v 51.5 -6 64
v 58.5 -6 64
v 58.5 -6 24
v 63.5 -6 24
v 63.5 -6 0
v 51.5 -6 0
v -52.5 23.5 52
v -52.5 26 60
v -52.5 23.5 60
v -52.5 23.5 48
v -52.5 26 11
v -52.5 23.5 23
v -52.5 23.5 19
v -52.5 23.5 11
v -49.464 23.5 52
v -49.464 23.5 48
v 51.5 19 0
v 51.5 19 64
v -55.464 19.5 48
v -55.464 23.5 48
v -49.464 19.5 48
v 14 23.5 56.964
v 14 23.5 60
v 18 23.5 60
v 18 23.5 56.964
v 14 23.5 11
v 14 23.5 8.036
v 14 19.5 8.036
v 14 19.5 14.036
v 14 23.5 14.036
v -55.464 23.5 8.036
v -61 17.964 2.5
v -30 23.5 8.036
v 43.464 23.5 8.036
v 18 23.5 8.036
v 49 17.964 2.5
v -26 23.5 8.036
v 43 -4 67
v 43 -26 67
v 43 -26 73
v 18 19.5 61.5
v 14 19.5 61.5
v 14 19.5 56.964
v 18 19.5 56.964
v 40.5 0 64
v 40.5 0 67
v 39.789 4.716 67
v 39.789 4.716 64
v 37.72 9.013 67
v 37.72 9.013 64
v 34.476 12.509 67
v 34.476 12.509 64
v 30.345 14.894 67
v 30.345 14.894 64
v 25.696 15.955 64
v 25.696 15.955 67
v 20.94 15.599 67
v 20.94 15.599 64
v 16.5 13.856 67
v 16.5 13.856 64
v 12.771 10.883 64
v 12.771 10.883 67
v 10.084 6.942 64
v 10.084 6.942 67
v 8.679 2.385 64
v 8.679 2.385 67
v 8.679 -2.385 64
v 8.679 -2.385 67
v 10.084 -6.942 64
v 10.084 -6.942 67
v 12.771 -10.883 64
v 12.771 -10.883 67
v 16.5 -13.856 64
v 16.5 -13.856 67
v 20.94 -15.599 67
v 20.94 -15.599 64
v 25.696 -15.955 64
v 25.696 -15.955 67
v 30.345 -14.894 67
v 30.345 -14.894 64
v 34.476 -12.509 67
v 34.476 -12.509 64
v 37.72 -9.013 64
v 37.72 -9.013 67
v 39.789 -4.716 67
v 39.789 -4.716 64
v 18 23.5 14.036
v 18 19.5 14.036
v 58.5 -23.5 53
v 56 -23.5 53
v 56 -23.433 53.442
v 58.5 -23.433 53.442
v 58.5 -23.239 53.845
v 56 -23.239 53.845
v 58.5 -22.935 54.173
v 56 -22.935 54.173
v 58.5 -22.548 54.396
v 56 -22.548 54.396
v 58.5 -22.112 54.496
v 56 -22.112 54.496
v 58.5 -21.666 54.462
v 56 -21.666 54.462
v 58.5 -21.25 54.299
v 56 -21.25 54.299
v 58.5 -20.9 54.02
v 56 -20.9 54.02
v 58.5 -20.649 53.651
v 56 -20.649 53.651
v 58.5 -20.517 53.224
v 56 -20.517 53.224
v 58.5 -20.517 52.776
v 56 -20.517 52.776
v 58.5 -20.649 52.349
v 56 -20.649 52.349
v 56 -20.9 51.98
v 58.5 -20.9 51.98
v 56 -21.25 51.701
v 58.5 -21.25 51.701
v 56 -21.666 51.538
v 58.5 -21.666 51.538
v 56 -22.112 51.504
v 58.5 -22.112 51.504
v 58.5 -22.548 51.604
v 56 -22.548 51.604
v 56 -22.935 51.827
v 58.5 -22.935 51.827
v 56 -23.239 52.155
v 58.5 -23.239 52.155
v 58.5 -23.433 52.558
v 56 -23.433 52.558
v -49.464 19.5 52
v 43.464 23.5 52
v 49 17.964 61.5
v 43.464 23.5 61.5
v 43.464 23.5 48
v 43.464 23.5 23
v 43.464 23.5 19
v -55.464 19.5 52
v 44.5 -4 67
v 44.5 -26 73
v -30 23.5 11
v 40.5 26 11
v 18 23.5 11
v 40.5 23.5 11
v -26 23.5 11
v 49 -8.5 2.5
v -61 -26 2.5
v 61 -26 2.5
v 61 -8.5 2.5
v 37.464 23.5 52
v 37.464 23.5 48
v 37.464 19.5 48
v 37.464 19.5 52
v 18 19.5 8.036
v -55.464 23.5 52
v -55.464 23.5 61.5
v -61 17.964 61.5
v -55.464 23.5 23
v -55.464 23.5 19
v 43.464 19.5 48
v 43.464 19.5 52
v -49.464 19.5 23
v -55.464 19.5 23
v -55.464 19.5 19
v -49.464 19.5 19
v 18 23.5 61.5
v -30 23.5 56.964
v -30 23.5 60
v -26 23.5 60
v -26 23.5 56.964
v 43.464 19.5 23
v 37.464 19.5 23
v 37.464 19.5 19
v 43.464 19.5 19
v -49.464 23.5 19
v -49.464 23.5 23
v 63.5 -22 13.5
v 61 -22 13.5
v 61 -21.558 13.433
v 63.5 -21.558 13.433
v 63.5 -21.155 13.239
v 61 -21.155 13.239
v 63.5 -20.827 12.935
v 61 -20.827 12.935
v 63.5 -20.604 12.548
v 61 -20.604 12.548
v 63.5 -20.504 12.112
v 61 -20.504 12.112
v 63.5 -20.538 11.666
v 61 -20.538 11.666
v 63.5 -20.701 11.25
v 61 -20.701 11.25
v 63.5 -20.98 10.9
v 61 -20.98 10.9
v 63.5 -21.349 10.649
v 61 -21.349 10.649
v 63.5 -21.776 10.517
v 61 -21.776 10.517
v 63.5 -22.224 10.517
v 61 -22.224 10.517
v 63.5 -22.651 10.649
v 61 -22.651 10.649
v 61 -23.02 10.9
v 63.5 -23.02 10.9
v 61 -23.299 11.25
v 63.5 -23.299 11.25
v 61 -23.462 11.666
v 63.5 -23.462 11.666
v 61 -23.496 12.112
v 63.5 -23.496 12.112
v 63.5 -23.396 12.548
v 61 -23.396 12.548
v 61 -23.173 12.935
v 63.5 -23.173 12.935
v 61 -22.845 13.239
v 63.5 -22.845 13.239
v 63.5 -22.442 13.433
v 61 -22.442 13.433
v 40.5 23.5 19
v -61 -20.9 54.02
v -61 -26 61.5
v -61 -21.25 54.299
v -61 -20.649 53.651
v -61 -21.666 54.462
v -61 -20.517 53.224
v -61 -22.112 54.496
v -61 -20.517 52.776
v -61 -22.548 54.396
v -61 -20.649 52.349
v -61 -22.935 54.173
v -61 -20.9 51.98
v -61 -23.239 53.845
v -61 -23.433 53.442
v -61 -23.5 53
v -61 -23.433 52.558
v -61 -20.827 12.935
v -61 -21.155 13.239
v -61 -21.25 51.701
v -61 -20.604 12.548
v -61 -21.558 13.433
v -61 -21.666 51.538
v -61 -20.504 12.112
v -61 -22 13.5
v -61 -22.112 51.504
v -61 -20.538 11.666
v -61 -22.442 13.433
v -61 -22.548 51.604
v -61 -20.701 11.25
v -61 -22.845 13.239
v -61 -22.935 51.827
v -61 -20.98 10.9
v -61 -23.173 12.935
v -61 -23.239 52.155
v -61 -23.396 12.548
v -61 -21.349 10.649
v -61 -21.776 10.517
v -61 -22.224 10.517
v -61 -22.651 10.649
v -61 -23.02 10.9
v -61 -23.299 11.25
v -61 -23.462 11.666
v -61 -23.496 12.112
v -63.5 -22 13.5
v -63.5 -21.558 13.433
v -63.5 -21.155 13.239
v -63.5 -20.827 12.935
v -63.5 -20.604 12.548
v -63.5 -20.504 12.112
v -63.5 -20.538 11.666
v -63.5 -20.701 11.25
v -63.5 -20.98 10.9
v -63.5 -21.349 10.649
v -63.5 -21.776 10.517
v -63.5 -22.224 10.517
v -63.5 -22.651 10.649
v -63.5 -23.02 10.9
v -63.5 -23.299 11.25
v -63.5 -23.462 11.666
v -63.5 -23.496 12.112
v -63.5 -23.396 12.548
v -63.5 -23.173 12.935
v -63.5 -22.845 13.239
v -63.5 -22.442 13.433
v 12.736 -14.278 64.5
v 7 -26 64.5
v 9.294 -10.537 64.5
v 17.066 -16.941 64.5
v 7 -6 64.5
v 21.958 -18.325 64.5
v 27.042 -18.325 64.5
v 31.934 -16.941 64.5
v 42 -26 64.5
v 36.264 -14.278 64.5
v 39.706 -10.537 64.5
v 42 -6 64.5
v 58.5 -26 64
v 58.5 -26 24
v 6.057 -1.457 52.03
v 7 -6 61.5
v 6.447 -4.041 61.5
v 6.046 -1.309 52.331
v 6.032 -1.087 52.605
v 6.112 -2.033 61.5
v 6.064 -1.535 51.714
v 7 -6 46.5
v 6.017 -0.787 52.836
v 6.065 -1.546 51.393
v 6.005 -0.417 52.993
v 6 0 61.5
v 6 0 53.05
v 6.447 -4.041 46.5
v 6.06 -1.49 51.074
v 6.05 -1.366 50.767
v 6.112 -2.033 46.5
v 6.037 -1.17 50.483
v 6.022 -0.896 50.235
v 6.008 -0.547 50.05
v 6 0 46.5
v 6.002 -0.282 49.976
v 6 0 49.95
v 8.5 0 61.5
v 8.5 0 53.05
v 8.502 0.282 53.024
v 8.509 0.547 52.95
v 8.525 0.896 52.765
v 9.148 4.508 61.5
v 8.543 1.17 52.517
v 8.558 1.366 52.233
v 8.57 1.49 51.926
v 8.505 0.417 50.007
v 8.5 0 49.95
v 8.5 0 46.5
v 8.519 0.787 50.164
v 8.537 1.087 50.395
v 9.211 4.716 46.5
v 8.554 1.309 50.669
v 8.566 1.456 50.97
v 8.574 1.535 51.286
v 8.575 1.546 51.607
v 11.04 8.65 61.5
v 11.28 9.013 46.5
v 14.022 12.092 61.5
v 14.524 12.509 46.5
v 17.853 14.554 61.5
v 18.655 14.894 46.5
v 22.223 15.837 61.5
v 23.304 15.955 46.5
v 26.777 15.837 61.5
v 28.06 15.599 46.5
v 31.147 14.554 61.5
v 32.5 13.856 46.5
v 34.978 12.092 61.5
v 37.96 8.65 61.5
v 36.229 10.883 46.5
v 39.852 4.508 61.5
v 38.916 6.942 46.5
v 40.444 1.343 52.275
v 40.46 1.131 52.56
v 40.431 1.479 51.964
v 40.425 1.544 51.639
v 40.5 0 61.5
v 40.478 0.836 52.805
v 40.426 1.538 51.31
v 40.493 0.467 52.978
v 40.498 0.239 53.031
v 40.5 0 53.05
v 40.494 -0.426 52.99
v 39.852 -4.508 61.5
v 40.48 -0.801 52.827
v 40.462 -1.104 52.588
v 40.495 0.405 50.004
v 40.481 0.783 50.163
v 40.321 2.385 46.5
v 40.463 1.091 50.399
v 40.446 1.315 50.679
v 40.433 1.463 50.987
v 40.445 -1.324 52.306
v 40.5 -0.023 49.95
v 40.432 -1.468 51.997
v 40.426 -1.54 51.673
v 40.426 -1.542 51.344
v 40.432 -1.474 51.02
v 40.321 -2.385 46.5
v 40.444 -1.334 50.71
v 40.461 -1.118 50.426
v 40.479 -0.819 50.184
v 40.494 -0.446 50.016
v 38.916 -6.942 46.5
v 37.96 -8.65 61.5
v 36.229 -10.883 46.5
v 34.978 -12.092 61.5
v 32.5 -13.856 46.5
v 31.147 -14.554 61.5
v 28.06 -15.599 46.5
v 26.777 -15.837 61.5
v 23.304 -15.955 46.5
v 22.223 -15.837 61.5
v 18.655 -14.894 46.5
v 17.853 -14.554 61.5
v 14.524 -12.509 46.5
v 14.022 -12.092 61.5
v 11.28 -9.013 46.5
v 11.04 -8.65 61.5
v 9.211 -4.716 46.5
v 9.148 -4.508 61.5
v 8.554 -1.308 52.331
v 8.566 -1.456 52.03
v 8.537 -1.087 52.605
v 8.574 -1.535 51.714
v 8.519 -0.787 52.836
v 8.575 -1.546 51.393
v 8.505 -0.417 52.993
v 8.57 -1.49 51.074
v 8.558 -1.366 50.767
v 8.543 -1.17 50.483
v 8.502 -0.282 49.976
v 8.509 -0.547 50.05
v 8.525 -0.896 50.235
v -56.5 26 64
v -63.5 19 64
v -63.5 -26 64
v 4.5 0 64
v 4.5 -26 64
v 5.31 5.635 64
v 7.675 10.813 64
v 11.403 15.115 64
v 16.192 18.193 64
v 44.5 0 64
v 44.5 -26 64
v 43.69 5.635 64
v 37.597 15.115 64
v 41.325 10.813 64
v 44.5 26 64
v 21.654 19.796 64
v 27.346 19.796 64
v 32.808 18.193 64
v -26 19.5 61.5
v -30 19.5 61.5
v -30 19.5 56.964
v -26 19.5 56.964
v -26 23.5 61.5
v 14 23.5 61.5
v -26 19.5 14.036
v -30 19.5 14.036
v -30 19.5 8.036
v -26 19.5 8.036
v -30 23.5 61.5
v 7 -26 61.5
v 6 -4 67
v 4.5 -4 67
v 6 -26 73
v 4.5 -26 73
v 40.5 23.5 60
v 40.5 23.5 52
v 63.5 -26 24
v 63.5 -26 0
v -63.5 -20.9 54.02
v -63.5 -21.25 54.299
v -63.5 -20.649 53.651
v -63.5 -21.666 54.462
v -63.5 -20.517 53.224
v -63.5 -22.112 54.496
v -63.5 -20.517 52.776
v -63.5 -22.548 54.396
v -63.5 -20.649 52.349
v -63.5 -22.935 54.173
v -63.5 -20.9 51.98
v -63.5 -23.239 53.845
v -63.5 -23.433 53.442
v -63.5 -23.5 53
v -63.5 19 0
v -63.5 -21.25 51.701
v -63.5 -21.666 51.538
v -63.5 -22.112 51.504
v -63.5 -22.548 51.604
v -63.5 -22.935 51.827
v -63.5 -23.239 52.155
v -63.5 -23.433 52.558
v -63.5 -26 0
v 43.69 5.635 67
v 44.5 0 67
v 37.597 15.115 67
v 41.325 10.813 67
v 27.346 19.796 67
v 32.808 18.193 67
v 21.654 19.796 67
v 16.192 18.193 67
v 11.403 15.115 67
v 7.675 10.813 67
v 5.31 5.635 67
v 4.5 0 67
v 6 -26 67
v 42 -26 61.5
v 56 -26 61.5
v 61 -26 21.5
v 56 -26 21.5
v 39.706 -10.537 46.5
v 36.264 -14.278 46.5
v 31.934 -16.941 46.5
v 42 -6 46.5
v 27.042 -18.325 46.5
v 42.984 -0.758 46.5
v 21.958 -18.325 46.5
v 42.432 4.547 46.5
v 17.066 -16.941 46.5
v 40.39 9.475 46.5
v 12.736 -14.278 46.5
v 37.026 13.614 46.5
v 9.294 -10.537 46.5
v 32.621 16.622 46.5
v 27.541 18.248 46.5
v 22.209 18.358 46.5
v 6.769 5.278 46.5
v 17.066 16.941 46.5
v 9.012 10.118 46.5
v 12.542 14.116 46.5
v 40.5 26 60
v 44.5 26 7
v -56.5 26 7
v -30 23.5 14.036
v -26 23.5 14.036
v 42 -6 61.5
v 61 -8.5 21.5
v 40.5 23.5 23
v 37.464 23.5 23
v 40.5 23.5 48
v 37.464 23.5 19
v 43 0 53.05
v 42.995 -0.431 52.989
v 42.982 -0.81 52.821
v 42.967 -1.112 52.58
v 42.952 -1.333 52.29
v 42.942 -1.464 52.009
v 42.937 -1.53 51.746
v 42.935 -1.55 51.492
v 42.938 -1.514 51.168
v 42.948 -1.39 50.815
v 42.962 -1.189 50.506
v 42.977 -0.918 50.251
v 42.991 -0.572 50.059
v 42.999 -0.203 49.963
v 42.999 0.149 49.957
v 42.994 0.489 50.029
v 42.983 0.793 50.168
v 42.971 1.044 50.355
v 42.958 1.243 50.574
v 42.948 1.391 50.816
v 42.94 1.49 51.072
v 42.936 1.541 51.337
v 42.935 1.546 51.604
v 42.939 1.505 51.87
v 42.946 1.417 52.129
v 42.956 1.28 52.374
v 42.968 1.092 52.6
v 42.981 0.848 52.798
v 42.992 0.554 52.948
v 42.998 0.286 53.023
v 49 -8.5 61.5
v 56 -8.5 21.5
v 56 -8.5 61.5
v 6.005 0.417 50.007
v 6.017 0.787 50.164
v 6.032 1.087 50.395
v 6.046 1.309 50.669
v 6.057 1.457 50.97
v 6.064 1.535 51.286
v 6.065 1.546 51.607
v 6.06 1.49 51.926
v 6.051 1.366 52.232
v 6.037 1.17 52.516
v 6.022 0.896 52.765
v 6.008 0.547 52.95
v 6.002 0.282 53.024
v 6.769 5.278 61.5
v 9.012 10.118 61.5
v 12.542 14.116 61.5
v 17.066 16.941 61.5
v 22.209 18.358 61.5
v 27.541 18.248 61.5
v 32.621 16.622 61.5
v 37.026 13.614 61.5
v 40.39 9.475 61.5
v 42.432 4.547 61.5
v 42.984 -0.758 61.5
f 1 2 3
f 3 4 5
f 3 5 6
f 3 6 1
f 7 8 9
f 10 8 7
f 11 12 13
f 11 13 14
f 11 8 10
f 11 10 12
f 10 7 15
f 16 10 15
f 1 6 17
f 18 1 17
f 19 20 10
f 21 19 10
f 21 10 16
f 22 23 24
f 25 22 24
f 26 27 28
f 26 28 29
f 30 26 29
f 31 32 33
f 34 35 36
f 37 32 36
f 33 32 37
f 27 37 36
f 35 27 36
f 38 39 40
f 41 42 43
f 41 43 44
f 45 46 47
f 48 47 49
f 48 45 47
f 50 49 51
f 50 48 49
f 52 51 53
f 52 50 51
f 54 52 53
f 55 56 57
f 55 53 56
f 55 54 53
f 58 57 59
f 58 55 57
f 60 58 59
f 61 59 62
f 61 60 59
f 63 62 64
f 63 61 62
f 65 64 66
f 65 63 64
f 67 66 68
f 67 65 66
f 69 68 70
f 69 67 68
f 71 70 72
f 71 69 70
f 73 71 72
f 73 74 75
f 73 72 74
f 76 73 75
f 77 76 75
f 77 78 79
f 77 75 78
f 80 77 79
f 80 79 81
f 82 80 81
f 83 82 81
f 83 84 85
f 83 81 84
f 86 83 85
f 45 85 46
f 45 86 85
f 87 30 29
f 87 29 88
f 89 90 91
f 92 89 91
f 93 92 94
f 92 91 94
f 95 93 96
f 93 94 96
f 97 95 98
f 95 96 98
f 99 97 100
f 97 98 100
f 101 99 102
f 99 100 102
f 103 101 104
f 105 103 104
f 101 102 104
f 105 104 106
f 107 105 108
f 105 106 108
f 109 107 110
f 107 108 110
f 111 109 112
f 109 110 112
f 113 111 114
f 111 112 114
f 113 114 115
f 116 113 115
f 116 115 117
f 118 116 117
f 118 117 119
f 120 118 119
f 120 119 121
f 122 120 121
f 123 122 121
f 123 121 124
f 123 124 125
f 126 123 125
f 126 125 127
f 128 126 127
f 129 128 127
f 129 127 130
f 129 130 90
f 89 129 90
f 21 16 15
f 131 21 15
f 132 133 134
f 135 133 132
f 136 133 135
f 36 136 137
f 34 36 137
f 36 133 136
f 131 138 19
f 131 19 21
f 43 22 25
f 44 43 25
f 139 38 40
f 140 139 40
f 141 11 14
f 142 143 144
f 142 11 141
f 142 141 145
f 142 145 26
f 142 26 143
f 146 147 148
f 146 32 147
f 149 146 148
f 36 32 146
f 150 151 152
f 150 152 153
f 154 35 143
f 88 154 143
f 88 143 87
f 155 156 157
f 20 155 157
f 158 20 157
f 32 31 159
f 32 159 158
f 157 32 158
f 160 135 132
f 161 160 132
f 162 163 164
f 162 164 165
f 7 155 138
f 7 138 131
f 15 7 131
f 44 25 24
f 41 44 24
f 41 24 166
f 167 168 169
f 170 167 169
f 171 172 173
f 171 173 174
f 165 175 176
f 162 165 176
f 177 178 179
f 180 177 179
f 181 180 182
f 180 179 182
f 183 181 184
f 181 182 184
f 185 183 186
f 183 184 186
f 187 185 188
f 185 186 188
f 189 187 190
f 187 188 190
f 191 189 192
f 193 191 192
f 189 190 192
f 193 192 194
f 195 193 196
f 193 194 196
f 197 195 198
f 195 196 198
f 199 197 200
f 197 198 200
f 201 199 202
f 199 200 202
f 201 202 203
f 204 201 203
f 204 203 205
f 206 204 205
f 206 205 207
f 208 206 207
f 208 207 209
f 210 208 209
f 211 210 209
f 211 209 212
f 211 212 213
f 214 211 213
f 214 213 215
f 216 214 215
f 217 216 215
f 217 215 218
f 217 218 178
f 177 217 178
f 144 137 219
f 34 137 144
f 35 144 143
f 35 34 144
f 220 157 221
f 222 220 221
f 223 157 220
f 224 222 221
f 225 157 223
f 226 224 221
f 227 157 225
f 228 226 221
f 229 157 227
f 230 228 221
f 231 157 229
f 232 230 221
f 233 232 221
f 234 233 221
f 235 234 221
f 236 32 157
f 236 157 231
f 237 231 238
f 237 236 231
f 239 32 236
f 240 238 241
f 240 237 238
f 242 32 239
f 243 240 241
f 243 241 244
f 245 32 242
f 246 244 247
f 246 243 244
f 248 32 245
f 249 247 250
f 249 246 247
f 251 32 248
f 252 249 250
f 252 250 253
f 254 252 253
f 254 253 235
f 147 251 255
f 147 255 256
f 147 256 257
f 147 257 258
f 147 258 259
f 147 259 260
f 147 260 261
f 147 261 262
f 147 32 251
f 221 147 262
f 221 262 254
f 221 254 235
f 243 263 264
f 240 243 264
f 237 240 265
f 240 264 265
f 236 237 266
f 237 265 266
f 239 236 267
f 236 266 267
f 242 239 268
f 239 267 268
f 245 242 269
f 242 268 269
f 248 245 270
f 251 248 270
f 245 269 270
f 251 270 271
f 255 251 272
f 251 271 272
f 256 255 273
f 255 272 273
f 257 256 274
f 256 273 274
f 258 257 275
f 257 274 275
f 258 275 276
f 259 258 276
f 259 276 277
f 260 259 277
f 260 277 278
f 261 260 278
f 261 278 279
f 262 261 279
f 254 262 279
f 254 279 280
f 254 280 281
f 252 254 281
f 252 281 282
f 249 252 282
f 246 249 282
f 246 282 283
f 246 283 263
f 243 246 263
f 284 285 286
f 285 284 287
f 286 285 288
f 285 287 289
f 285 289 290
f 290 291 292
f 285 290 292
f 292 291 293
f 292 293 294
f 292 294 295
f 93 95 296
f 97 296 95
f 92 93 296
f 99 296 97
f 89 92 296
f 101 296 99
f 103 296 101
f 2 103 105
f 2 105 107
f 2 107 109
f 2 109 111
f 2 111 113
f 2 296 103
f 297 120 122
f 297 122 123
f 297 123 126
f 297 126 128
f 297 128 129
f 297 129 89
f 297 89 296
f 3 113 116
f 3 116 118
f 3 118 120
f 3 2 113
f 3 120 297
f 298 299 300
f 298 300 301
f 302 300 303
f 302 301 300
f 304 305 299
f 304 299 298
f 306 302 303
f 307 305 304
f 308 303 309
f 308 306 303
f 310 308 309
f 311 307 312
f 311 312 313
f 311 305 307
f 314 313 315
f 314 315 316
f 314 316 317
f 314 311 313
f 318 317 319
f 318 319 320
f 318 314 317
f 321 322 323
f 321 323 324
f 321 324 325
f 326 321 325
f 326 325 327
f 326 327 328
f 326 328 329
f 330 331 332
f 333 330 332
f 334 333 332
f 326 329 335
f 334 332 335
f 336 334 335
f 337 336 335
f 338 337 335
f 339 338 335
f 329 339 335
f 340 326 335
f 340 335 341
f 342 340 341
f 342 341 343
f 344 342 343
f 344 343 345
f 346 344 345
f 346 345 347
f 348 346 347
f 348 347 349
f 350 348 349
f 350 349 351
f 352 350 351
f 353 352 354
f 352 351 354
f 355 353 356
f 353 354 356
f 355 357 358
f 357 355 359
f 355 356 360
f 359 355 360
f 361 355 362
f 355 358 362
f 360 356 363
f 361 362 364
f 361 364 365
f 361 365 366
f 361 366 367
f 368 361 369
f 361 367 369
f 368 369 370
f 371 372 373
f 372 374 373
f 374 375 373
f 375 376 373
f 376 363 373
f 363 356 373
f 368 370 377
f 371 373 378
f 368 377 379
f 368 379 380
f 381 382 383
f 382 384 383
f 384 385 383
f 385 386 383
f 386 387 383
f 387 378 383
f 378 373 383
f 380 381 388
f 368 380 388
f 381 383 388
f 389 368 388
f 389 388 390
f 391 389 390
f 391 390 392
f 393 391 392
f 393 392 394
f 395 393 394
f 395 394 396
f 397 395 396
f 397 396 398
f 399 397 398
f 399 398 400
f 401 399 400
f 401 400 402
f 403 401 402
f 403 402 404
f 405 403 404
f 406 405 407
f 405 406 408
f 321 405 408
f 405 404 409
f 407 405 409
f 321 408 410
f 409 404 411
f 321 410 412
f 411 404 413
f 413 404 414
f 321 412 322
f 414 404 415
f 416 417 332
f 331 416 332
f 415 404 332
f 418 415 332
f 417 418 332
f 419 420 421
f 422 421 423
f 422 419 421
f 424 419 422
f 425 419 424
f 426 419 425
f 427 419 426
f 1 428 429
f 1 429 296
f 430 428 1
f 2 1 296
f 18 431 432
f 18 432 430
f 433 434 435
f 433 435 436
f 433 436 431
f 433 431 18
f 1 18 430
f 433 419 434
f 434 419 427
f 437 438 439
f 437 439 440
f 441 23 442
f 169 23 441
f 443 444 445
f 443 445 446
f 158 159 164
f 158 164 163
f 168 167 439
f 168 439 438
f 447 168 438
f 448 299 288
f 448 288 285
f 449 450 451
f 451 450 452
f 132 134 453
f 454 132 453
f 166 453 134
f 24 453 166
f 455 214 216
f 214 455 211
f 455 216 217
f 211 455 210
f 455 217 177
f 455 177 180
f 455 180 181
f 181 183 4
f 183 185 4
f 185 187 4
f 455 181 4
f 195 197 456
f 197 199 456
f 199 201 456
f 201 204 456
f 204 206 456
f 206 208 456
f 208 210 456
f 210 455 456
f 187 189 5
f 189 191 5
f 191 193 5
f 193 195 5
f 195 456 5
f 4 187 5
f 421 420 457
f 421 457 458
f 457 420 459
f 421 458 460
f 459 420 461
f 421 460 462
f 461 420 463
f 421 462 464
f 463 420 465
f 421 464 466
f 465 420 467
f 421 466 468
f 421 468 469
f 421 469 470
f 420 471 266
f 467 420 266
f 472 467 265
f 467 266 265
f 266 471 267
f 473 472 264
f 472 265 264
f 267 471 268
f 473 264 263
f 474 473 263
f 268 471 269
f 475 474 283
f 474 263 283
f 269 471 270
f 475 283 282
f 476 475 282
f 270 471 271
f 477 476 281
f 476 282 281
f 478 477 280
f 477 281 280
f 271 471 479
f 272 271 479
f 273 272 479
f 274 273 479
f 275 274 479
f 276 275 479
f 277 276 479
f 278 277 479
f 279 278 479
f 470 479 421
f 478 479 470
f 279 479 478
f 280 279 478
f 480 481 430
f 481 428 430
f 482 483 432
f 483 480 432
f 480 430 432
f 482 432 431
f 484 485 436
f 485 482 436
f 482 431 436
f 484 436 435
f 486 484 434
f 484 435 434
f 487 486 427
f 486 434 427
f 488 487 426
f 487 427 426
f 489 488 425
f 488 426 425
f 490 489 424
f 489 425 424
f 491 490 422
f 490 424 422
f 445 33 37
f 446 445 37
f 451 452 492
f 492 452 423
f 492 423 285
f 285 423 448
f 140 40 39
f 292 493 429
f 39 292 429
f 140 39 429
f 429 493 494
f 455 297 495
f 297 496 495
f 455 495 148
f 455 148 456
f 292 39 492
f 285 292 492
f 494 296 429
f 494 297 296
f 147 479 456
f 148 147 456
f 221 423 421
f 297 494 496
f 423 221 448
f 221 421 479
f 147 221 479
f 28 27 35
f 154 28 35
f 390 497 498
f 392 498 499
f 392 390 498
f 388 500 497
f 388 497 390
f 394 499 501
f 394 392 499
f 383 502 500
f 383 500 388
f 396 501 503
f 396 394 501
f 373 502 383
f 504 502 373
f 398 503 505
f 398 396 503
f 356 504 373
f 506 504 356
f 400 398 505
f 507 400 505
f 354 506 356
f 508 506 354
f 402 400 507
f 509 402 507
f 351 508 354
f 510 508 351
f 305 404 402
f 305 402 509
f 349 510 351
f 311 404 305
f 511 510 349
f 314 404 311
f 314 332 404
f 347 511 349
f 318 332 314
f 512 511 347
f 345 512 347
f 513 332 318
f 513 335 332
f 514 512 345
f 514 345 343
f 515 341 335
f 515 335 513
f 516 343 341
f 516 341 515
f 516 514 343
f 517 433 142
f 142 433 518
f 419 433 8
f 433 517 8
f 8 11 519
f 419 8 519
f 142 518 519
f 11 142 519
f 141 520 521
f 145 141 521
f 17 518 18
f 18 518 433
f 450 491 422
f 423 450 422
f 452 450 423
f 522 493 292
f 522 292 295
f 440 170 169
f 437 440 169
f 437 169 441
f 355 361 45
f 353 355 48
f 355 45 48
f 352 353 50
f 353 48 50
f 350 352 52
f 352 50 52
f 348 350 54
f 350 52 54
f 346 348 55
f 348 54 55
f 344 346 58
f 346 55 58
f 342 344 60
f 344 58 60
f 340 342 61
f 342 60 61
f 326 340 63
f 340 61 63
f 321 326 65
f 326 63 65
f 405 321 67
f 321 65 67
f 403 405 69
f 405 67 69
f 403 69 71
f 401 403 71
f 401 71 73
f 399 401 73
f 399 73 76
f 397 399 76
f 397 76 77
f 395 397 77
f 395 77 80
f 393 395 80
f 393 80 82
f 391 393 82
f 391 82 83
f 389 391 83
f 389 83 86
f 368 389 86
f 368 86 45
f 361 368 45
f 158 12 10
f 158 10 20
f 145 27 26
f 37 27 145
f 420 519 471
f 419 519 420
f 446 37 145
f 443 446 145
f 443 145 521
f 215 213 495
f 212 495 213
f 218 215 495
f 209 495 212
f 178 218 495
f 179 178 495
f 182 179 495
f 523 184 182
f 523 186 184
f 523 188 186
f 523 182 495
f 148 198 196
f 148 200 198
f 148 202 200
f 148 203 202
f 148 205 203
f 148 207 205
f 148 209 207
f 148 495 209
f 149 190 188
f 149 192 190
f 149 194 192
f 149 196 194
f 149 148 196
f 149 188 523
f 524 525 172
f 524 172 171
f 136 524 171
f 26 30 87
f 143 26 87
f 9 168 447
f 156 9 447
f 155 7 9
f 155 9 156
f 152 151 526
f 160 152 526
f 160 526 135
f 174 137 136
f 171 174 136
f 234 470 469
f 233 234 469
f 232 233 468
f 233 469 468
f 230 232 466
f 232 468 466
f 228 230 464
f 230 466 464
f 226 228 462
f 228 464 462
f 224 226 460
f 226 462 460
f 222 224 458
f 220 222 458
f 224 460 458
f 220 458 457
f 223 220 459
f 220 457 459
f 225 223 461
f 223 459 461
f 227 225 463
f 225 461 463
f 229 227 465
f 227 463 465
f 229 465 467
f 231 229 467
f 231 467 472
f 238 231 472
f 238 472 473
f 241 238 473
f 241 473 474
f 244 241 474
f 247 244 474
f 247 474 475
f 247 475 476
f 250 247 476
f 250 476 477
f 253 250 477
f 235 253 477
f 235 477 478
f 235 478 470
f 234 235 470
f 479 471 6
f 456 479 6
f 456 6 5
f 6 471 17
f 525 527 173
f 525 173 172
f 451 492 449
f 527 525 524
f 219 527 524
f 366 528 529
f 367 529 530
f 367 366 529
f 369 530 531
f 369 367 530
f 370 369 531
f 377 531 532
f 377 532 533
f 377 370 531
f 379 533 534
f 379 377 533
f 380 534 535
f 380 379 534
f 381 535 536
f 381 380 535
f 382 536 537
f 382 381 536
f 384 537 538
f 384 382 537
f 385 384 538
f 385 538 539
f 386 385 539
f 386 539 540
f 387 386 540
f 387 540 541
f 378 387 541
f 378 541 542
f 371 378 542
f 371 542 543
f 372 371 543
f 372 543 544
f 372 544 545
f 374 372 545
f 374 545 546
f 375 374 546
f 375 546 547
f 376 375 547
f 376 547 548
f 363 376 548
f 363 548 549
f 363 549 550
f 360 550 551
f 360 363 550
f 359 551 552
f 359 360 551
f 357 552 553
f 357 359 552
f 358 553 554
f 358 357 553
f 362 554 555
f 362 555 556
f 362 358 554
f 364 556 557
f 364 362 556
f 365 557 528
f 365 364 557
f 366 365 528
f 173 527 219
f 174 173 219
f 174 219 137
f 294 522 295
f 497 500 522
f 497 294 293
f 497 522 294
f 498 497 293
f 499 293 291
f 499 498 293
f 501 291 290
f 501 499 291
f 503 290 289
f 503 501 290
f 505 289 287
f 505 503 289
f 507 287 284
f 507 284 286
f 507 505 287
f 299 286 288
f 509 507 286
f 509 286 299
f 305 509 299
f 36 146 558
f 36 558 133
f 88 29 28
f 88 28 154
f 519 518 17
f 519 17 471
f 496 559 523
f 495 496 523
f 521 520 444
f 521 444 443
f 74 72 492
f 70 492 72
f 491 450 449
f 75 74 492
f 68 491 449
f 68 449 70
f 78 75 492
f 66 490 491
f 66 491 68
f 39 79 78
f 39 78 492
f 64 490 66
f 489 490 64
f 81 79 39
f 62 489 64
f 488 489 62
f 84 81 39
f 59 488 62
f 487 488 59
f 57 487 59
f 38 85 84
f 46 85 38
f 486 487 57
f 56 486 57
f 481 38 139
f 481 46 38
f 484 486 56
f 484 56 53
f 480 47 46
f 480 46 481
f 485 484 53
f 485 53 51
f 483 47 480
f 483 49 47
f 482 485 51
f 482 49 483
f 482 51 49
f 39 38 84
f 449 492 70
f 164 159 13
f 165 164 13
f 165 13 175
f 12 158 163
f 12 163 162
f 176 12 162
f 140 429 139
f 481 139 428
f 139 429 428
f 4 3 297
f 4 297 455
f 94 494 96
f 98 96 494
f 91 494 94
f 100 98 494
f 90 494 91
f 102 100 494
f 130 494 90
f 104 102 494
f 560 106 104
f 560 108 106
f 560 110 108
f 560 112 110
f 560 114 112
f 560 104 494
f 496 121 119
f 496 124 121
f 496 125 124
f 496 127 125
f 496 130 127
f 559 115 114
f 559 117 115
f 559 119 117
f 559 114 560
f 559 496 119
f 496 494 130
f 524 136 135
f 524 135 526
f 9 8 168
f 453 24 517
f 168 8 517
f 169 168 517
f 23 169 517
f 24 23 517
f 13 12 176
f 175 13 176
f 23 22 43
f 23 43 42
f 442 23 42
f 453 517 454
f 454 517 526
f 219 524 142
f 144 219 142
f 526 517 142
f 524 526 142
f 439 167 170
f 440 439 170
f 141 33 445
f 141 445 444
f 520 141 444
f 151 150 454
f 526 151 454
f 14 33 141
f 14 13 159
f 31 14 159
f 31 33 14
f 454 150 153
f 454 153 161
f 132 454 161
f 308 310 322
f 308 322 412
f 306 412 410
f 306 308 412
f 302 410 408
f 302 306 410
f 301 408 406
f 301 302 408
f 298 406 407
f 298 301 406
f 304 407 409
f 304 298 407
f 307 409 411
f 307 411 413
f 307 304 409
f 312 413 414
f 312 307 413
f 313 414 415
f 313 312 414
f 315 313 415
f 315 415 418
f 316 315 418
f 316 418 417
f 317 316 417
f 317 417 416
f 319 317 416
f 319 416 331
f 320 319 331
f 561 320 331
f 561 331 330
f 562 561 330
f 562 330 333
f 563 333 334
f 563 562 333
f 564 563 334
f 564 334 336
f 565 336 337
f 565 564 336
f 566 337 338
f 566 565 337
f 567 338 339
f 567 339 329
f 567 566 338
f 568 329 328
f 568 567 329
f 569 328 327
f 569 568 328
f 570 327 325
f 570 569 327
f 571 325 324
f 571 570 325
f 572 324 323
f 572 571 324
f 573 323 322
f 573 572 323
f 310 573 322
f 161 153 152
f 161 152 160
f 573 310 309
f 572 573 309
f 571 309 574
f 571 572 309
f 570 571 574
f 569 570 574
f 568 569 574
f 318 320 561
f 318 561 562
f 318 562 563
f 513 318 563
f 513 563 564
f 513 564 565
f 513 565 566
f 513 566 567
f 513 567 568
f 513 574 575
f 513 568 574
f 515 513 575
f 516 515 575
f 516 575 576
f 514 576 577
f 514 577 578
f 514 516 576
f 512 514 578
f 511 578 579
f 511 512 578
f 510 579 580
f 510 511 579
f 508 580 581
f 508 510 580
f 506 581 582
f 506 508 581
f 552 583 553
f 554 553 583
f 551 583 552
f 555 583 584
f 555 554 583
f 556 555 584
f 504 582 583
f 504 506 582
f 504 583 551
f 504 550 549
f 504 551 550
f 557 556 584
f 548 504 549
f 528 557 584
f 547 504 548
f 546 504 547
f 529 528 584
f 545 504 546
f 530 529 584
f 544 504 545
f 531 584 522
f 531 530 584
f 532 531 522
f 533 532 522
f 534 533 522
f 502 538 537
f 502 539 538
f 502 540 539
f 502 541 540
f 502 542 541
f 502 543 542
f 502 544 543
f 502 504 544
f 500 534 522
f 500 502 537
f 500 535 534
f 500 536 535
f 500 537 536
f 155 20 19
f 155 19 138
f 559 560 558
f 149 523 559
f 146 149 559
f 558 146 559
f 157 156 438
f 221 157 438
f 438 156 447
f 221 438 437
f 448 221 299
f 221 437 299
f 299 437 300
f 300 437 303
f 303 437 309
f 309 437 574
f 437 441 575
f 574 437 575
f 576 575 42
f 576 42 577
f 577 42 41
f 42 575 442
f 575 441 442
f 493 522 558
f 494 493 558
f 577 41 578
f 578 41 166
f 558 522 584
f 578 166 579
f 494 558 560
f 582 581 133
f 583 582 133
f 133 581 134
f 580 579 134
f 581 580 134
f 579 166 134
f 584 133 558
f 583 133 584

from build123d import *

# Parameters (mm, degrees)
BOSS_EXTRUDE1_DEPTH = 64
SKETCH2_R           = 20
SKETCH2_R_2         = 16
BOSS_EXTRUDE2_DEPTH = 3
CHAMFER1_SIZE       = 7
BOSS_EXTRUDE3_REACH = 97.902
SKETCH4_W           = 1.5
SKETCH4_H           = 22
BOSS_EXTRUDE4_DEPTH = 6
CUT_EXTRUDE1_DEPTH  = 104.097041665
SKETCH6_W           = 5
SKETCH6_H           = 40
CUT_EXTRUDE2_DEPTH  = 102.908046787
SHELL1_START        = 2.5
SHELL1_DEPTH        = 59
SHELL1_2_OUTLINE_W  = 5
SHELL1_2_OUTLINE_H  = 17.5
SHELL1_2_DEPTH      = 19
SHELL1_START_2      = 61.5
SHELL1_3_DEPTH      = 3
SHELL1_START_3      = 10.935028843
SHELL1_4_DEPTH      = 2.5
CUT_EXTRUDE3_REACH  = 95.831
SKETCH7_R           = 16
BOSS_EXTRUDE5_START = 15
SKETCH8_R           = 16
BOSS_EXTRUDE5_DEPTH = 15
CUT_EXTRUDE4_REACH  = 111.842
SKETCH9_W           = 93
SKETCH9_H           = 49
SKETCH10_W          = 6
SKETCH10_H          = 4
SKETCH10_W_2        = 4
SKETCH10_H_2        = 6
BOSS_EXTRUDE6_DEPTH = 4
SKETCH11_R          = 1.5
CUT_EXTRUDE5_DEPTH  = 149.7749979
SKETCH12_R          = 1.55
CUT_EXTRUDE6_DEPTH  = 44


with BuildPart() as part:
    # Sketch1 → Boss-Extrude1 (new body)
    with BuildSketch(Plane.XY):
        Polygon((63.5, -26), (63.5, -6), (51.5, -6), (51.5, 26), (-63.5, 26), (-63.5, -26), align=None)
    extrude(amount=BOSS_EXTRUDE1_DEPTH)

    # Sketch2 → Boss-Extrude2 (add)
    with BuildSketch(Plane.XY.offset(64)):
        with Locations((24.5, 0)):
            Circle(SKETCH2_R)
        with Locations((24.5, 0)):
            Circle(SKETCH2_R_2, mode=Mode.SUBTRACT)
    extrude(amount=BOSS_EXTRUDE2_DEPTH)

    # Chamfer1
    chamfer1_edges = [part.edges().sort_by_distance(p)[0] for p in [
        (-63.5, 26, 32),
        (51.5, 26, 32),
        (-6, 26, 0),
    ]]
    chamfer(chamfer1_edges, length=CHAMFER1_SIZE)

    # Sketch3 → Boss-Extrude3 (add, up to next)
    with BuildSketch(Plane.XY.offset(67), mode=Mode.PRIVATE) as boss_extrude3_sk1:
        with BuildLine():
            ThreePointArc((6.5, -8.717797887), (5.00641131, -4.472135955), (4.5, 0))
            Line((4.5, 0), (4.5, -26))
            Line((4.5, -26), (6.5, -26))
            Line((6.5, -26), (6.5, -8.717797887))
        make_face()
    boss_extrude3_tool1 = extrude(boss_extrude3_sk1.sketch, amount=-BOSS_EXTRUDE3_REACH, mode=Mode.PRIVATE) - part.part
    # Sketch3 → Boss-Extrude3 (add, up to next)
    with BuildSketch(Plane.XY.offset(67), mode=Mode.PRIVATE) as boss_extrude3_sk2:
        with BuildLine():
            Line((44.5, -26), (44.5, 0))
            ThreePointArc((44.5, 0), (43.99358869, -4.472135955), (42.5, -8.717797887))
            Line((42.5, -8.717797887), (42.5, -26))
            Line((42.5, -26), (44.5, -26))
        make_face()
    boss_extrude3_tool2 = extrude(boss_extrude3_sk2.sketch, amount=-BOSS_EXTRUDE3_REACH, mode=Mode.PRIVATE) - part.part
    # Sketch3 → Boss-Extrude3 (add, up to next)
    with BuildSketch(Plane.XY.offset(67), mode=Mode.PRIVATE) as boss_extrude3_sk3:
        with BuildLine():
            ThreePointArc((42.5, -8.717797887), (24.5, -20), (6.5, -8.717797887))
            Line((6.5, -8.717797887), (6.5, -26))
            Line((6.5, -26), (42.5, -26))
            Line((42.5, -26), (42.5, -8.717797887))
        make_face()
    boss_extrude3_tool3 = extrude(boss_extrude3_sk3.sketch, amount=-BOSS_EXTRUDE3_REACH, mode=Mode.PRIVATE) - part.part
    add(boss_extrude3_tool1.solids().sort_by_distance((5.442676, -15.832473, 67))[0])
    add(boss_extrude3_tool2.solids().sort_by_distance((43.557324, -15.832473, 67))[0])
    add(boss_extrude3_tool3.solids().sort_by_distance((24.5, -20.87134, 67))[0])

    # Sketch4 → Boss-Extrude4 (add)
    with BuildSketch(Plane.XY.offset(67)):
        with Locations((43.75, -15)):
            Rectangle(SKETCH4_W, SKETCH4_H)
        with Locations((5.25, -15)):
            Rectangle(SKETCH4_W, SKETCH4_H)
    extrude(amount=BOSS_EXTRUDE4_DEPTH)

    # Sketch5 → Cut-Extrude1 (cut, through all)
    with BuildSketch(Plane.ZY.offset(-4.5)):
        Polygon((67, -4), (73, -26), (73, -4), align=None)
    extrude(amount=-CUT_EXTRUDE1_DEPTH, mode=Mode.SUBTRACT)

    # Sketch6 → Cut-Extrude2 (cut, through all)
    with BuildSketch(Plane(origin=(0, -6, 0), x_dir=(1, 0, 0), z_dir=(0, 1, 0))):
        with Locations((61, -44)):
            Rectangle(SKETCH6_W, SKETCH6_H)
    extrude(amount=-CUT_EXTRUDE2_DEPTH, mode=Mode.SUBTRACT)

    # Shell1: read off the stored shape, not the designer's step
    # Shell1 outline → Shell1 (cut)
    with BuildSketch(Plane.XY.offset(SHELL1_START)):
        Polygon((56, -8.5), (49, -8.5), (49, 17.964466094), (43.464466094, 23.5), (-55.464466094, 23.5), (-61, 17.964466094), (-61, -26), (56, -26), align=None)
    extrude(amount=SHELL1_DEPTH, mode=Mode.SUBTRACT)

    # Shell1 2 outline → Shell1 2 (cut)
    with BuildSketch(Plane.XY.offset(SHELL1_START)):
        with Locations((58.5, -17.25)):
            Rectangle(SHELL1_2_OUTLINE_W, SHELL1_2_OUTLINE_H)
    extrude(amount=SHELL1_2_DEPTH, mode=Mode.SUBTRACT)

    # Shell1 3 outline → Shell1 3 (cut)
    with BuildSketch(Plane.XY.offset(SHELL1_START_2)):
        with BuildLine():
            Line((7, -26), (42, -26))
            Line((42, -26), (42, -6))
            ThreePointArc((42, -6), (24.5, -18.5), (7, -6))
            Line((7, -6), (7, -26))
        make_face()
    extrude(amount=SHELL1_3_DEPTH, mode=Mode.SUBTRACT)

    # Shell1 4 outline → Shell1 4 (add)
    with BuildSketch(Plane(origin=(0, 0, 0), x_dir=(1, 0, 0), z_dir=(0, 0.707106781186545, -0.70710678118655)).offset(SHELL1_START_3)):
        Polygon((43.464466094, -22.298989873), (49, -14.470562748), (-61, -14.470562748), (-55.464466094, -22.298989873), align=None)
    extrude(amount=SHELL1_4_DEPTH)

    # Sketch7 → Cut-Extrude3 (cut, up to next)
    with BuildSketch(Plane.XY.offset(64), mode=Mode.PRIVATE) as cut_extrude3_sk1:
        with Locations((24.5, 0)):
            Circle(SKETCH7_R)
    cut_extrude3_tool1 = extrude(cut_extrude3_sk1.sketch, amount=-CUT_EXTRUDE3_REACH, mode=Mode.PRIVATE) & part.part
    add(cut_extrude3_tool1.solids().sort_by_distance((24.5, 0, 64))[0], mode=Mode.SUBTRACT)

    # Sketch8 → Boss-Extrude5 (add)
    with BuildSketch(Plane(origin=(0, 0, 61.5), x_dir=(-1, 0, 0), z_dir=(0, 0, -1)).offset(BOSS_EXTRUDE5_START)):
        with BuildLine():
            ThreePointArc((-6, 0), (-27.541381265, 18.248287591), (-42, -6))
            ThreePointArc((-42, -6), (-24.5, -18.5), (-7, -6))
            ThreePointArc((-7, -6), (-6.251712409, -3.041381265), (-6, 0))
        make_face()
        with Locations((-24.5, 0)):
            Circle(SKETCH8_R, mode=Mode.SUBTRACT)
    extrude(amount=-BOSS_EXTRUDE5_DEPTH)

    # Sketch9 → Cut-Extrude4 (cut, up to next)
    with BuildSketch(Plane(origin=(0, 26, 0), x_dir=(1, 0, 0), z_dir=(0, 1, 0)), mode=Mode.PRIVATE) as cut_extrude4_sk1:
        with Locations((-6, -35.5)):
            Rectangle(SKETCH9_W, SKETCH9_H)
    cut_extrude4_tool1 = extrude(cut_extrude4_sk1.sketch, amount=-CUT_EXTRUDE4_REACH, mode=Mode.PRIVATE) & part.part
    add(cut_extrude4_tool1.solids().sort_by_distance((-6, 26, 35.5))[0], mode=Mode.SUBTRACT)

    # Sketch10 → Boss-Extrude6 (add)
    with BuildSketch(Plane.XZ.offset(-23.5)):
        with Locations((-52.464466094, 50)):
            Rectangle(SKETCH10_W, SKETCH10_H)
        with Locations((-52.464466094, 21)):
            Rectangle(SKETCH10_W, SKETCH10_H)
        with Locations((40.464466094, 21)):
            Rectangle(SKETCH10_W, SKETCH10_H)
        with Locations((40.464466094, 50)):
            Rectangle(SKETCH10_W, SKETCH10_H)
        with Locations((-28, 11.035533906)):
            Rectangle(SKETCH10_W_2, SKETCH10_H_2)
        with Locations((16, 11.035533906)):
            Rectangle(SKETCH10_W_2, SKETCH10_H_2)
        with Locations((16, 59.964466094)):
            Rectangle(SKETCH10_W_2, SKETCH10_H_2)
        with Locations((-28, 59.964466094)):
            Rectangle(SKETCH10_W_2, SKETCH10_H_2)
    extrude(amount=BOSS_EXTRUDE6_DEPTH)

    # Sketch11 → Cut-Extrude5 (cut, through all)
    with BuildSketch(Plane.ZY.offset(63.5)):
        with Locations(Location((53, -22, 0), (0, 0, 270))):
            Circle(SKETCH11_R)
        with Locations((12, -22)):
            Circle(SKETCH11_R)
    extrude(amount=-CUT_EXTRUDE5_DEPTH, mode=Mode.SUBTRACT)

    # Sketch12 → Cut-Extrude6 (cut)
    with BuildSketch(Plane(origin=(0, 0, 0), x_dir=(0, 0, -1), z_dir=(1, 0, 0))):
        with Locations(Location((-51.5, 0, 0), (0, 0, 180))):
            Circle(SKETCH12_R)
    extrude(amount=CUT_EXTRUDE6_DEPTH, mode=Mode.SUBTRACT)


solid = part.part
